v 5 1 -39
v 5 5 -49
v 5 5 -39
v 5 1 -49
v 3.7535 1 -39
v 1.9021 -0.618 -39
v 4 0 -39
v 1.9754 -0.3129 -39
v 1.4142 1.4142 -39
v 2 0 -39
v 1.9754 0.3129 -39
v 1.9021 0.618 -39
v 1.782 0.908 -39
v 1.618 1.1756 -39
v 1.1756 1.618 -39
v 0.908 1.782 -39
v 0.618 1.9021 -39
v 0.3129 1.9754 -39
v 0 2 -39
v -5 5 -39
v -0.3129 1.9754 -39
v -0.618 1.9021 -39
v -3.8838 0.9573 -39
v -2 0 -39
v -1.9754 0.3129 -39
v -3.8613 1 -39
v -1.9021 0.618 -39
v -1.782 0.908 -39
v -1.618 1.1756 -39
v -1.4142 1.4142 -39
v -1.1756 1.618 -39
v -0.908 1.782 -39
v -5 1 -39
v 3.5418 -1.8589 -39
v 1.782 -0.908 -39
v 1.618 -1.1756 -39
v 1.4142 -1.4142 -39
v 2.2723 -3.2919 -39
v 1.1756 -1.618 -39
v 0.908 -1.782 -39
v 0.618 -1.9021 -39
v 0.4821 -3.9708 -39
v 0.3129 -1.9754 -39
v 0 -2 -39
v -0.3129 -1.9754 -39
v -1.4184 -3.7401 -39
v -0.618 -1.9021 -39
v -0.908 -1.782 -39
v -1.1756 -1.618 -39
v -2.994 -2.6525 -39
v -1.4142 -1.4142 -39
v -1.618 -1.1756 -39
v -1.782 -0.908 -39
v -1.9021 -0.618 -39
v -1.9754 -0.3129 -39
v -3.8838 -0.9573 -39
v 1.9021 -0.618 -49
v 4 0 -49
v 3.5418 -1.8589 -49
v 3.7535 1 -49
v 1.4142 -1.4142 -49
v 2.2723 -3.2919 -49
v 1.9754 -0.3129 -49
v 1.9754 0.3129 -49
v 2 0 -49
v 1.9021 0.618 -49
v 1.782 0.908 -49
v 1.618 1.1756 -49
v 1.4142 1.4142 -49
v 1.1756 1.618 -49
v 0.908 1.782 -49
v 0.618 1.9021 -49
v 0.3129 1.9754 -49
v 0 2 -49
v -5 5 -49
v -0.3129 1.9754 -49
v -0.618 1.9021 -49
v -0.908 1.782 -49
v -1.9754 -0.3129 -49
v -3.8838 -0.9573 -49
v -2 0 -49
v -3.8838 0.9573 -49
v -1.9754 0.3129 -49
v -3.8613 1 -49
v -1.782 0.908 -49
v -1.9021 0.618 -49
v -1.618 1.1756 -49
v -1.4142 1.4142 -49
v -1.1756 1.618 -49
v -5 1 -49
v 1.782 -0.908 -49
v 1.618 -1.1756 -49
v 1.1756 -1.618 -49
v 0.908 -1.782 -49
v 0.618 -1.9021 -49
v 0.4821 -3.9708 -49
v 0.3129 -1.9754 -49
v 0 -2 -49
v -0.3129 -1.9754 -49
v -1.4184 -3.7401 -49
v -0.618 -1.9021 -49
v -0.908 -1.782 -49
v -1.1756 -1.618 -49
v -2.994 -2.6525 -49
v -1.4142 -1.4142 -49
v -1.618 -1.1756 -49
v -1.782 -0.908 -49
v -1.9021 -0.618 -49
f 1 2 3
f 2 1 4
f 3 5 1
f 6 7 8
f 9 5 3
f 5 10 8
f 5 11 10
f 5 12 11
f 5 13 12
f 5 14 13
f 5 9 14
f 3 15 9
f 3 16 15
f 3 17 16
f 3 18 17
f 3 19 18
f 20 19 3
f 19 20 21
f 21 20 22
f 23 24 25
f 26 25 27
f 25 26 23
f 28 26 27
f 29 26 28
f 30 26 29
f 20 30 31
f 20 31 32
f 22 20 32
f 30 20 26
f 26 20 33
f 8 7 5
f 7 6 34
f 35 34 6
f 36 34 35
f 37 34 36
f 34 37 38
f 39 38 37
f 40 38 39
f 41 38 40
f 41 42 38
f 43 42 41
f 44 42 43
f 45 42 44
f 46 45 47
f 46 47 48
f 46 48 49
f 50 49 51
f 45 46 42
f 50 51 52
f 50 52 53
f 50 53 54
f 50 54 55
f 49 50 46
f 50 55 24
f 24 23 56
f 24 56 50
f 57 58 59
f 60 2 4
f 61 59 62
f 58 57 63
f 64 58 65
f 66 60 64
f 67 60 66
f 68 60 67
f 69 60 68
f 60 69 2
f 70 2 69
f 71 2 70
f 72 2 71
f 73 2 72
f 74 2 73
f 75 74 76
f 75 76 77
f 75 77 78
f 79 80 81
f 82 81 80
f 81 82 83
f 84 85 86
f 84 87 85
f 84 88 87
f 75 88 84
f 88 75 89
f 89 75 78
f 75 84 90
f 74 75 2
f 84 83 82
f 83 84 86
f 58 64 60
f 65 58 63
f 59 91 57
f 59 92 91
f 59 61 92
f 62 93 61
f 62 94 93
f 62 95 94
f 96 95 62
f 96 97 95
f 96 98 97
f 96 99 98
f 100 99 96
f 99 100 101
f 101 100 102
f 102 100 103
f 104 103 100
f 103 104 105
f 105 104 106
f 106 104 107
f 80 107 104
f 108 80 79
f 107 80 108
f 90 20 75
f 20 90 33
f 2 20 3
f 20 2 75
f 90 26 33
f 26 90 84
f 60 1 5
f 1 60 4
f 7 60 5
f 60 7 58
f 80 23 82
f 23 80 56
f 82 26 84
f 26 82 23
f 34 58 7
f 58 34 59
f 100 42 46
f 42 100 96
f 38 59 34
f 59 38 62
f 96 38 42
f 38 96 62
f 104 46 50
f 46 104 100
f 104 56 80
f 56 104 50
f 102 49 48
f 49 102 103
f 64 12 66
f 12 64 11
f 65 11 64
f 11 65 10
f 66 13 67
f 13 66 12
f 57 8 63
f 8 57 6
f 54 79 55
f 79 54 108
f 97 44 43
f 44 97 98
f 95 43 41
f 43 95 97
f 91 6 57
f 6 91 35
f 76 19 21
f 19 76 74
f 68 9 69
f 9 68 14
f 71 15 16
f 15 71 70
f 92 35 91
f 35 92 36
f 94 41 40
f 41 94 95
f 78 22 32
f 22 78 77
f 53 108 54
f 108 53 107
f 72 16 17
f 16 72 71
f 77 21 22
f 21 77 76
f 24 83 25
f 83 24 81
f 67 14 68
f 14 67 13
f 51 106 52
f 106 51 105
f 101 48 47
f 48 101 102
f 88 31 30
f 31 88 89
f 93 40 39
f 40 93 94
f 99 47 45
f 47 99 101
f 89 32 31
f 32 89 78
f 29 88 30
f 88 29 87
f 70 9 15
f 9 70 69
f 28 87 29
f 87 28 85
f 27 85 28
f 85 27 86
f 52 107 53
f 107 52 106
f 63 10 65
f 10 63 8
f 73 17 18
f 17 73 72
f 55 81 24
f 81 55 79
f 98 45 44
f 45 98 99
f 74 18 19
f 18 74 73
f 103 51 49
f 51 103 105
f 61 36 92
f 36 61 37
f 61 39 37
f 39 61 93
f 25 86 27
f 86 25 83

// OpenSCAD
module head_and_handle(){
	cylinder(r=2, h=100, center=true, $fn=40);
	translate([0,0,50+2])rotate([90,0,0])cylinder(r=2.4, h=40, center=true, $fn=40);
}

module cross_bar(){
	translate([0,5,-20])rotate([90,0,90])cylinder(r=2, h=200, center=true, $fn=30);
}

module t_connector(){
	difference(){
		translate([0,0,51])cube([7,10,10], center=true);
		translate([0,6,46])rotate([0,90,0])cylinder(r=3.5,h=10, center=true, $fn=100);
		translate([0,-6,46])rotate([0,90,0])cylinder(r=3.5,h=10, center=true, $fn=100);
		head_and_handle();	
	}	
}


module pivot(){
	difference(){
		union(){
			translate([0,1,-20])cube([6,8.5,10], center=true);
			translate([0,5,-20])rotate([90,0,90])cylinder(r=5,h=6, center=true);
		}
		head_and_handle();	
		cross_bar();
	}
}


module pad(){
	difference(){

	union(){

	translate([0,3,-44])cube([10,4,10], center=true);
	translate([0,0,-44])cylinder(h=10, r=4, center=true);
	}
	head_and_handle();
	}


}

module hammer(){
	head_and_handle();	
	t_connector();
	pivot();
	pad();
}

module hammers(){
	 for(d = [-50 : 20 : 50]){
	 	translate([d,0,0])hammer();
	 }
}

//pivot();
pad();
//hammers();
//cross_bar();
//t_connector();
